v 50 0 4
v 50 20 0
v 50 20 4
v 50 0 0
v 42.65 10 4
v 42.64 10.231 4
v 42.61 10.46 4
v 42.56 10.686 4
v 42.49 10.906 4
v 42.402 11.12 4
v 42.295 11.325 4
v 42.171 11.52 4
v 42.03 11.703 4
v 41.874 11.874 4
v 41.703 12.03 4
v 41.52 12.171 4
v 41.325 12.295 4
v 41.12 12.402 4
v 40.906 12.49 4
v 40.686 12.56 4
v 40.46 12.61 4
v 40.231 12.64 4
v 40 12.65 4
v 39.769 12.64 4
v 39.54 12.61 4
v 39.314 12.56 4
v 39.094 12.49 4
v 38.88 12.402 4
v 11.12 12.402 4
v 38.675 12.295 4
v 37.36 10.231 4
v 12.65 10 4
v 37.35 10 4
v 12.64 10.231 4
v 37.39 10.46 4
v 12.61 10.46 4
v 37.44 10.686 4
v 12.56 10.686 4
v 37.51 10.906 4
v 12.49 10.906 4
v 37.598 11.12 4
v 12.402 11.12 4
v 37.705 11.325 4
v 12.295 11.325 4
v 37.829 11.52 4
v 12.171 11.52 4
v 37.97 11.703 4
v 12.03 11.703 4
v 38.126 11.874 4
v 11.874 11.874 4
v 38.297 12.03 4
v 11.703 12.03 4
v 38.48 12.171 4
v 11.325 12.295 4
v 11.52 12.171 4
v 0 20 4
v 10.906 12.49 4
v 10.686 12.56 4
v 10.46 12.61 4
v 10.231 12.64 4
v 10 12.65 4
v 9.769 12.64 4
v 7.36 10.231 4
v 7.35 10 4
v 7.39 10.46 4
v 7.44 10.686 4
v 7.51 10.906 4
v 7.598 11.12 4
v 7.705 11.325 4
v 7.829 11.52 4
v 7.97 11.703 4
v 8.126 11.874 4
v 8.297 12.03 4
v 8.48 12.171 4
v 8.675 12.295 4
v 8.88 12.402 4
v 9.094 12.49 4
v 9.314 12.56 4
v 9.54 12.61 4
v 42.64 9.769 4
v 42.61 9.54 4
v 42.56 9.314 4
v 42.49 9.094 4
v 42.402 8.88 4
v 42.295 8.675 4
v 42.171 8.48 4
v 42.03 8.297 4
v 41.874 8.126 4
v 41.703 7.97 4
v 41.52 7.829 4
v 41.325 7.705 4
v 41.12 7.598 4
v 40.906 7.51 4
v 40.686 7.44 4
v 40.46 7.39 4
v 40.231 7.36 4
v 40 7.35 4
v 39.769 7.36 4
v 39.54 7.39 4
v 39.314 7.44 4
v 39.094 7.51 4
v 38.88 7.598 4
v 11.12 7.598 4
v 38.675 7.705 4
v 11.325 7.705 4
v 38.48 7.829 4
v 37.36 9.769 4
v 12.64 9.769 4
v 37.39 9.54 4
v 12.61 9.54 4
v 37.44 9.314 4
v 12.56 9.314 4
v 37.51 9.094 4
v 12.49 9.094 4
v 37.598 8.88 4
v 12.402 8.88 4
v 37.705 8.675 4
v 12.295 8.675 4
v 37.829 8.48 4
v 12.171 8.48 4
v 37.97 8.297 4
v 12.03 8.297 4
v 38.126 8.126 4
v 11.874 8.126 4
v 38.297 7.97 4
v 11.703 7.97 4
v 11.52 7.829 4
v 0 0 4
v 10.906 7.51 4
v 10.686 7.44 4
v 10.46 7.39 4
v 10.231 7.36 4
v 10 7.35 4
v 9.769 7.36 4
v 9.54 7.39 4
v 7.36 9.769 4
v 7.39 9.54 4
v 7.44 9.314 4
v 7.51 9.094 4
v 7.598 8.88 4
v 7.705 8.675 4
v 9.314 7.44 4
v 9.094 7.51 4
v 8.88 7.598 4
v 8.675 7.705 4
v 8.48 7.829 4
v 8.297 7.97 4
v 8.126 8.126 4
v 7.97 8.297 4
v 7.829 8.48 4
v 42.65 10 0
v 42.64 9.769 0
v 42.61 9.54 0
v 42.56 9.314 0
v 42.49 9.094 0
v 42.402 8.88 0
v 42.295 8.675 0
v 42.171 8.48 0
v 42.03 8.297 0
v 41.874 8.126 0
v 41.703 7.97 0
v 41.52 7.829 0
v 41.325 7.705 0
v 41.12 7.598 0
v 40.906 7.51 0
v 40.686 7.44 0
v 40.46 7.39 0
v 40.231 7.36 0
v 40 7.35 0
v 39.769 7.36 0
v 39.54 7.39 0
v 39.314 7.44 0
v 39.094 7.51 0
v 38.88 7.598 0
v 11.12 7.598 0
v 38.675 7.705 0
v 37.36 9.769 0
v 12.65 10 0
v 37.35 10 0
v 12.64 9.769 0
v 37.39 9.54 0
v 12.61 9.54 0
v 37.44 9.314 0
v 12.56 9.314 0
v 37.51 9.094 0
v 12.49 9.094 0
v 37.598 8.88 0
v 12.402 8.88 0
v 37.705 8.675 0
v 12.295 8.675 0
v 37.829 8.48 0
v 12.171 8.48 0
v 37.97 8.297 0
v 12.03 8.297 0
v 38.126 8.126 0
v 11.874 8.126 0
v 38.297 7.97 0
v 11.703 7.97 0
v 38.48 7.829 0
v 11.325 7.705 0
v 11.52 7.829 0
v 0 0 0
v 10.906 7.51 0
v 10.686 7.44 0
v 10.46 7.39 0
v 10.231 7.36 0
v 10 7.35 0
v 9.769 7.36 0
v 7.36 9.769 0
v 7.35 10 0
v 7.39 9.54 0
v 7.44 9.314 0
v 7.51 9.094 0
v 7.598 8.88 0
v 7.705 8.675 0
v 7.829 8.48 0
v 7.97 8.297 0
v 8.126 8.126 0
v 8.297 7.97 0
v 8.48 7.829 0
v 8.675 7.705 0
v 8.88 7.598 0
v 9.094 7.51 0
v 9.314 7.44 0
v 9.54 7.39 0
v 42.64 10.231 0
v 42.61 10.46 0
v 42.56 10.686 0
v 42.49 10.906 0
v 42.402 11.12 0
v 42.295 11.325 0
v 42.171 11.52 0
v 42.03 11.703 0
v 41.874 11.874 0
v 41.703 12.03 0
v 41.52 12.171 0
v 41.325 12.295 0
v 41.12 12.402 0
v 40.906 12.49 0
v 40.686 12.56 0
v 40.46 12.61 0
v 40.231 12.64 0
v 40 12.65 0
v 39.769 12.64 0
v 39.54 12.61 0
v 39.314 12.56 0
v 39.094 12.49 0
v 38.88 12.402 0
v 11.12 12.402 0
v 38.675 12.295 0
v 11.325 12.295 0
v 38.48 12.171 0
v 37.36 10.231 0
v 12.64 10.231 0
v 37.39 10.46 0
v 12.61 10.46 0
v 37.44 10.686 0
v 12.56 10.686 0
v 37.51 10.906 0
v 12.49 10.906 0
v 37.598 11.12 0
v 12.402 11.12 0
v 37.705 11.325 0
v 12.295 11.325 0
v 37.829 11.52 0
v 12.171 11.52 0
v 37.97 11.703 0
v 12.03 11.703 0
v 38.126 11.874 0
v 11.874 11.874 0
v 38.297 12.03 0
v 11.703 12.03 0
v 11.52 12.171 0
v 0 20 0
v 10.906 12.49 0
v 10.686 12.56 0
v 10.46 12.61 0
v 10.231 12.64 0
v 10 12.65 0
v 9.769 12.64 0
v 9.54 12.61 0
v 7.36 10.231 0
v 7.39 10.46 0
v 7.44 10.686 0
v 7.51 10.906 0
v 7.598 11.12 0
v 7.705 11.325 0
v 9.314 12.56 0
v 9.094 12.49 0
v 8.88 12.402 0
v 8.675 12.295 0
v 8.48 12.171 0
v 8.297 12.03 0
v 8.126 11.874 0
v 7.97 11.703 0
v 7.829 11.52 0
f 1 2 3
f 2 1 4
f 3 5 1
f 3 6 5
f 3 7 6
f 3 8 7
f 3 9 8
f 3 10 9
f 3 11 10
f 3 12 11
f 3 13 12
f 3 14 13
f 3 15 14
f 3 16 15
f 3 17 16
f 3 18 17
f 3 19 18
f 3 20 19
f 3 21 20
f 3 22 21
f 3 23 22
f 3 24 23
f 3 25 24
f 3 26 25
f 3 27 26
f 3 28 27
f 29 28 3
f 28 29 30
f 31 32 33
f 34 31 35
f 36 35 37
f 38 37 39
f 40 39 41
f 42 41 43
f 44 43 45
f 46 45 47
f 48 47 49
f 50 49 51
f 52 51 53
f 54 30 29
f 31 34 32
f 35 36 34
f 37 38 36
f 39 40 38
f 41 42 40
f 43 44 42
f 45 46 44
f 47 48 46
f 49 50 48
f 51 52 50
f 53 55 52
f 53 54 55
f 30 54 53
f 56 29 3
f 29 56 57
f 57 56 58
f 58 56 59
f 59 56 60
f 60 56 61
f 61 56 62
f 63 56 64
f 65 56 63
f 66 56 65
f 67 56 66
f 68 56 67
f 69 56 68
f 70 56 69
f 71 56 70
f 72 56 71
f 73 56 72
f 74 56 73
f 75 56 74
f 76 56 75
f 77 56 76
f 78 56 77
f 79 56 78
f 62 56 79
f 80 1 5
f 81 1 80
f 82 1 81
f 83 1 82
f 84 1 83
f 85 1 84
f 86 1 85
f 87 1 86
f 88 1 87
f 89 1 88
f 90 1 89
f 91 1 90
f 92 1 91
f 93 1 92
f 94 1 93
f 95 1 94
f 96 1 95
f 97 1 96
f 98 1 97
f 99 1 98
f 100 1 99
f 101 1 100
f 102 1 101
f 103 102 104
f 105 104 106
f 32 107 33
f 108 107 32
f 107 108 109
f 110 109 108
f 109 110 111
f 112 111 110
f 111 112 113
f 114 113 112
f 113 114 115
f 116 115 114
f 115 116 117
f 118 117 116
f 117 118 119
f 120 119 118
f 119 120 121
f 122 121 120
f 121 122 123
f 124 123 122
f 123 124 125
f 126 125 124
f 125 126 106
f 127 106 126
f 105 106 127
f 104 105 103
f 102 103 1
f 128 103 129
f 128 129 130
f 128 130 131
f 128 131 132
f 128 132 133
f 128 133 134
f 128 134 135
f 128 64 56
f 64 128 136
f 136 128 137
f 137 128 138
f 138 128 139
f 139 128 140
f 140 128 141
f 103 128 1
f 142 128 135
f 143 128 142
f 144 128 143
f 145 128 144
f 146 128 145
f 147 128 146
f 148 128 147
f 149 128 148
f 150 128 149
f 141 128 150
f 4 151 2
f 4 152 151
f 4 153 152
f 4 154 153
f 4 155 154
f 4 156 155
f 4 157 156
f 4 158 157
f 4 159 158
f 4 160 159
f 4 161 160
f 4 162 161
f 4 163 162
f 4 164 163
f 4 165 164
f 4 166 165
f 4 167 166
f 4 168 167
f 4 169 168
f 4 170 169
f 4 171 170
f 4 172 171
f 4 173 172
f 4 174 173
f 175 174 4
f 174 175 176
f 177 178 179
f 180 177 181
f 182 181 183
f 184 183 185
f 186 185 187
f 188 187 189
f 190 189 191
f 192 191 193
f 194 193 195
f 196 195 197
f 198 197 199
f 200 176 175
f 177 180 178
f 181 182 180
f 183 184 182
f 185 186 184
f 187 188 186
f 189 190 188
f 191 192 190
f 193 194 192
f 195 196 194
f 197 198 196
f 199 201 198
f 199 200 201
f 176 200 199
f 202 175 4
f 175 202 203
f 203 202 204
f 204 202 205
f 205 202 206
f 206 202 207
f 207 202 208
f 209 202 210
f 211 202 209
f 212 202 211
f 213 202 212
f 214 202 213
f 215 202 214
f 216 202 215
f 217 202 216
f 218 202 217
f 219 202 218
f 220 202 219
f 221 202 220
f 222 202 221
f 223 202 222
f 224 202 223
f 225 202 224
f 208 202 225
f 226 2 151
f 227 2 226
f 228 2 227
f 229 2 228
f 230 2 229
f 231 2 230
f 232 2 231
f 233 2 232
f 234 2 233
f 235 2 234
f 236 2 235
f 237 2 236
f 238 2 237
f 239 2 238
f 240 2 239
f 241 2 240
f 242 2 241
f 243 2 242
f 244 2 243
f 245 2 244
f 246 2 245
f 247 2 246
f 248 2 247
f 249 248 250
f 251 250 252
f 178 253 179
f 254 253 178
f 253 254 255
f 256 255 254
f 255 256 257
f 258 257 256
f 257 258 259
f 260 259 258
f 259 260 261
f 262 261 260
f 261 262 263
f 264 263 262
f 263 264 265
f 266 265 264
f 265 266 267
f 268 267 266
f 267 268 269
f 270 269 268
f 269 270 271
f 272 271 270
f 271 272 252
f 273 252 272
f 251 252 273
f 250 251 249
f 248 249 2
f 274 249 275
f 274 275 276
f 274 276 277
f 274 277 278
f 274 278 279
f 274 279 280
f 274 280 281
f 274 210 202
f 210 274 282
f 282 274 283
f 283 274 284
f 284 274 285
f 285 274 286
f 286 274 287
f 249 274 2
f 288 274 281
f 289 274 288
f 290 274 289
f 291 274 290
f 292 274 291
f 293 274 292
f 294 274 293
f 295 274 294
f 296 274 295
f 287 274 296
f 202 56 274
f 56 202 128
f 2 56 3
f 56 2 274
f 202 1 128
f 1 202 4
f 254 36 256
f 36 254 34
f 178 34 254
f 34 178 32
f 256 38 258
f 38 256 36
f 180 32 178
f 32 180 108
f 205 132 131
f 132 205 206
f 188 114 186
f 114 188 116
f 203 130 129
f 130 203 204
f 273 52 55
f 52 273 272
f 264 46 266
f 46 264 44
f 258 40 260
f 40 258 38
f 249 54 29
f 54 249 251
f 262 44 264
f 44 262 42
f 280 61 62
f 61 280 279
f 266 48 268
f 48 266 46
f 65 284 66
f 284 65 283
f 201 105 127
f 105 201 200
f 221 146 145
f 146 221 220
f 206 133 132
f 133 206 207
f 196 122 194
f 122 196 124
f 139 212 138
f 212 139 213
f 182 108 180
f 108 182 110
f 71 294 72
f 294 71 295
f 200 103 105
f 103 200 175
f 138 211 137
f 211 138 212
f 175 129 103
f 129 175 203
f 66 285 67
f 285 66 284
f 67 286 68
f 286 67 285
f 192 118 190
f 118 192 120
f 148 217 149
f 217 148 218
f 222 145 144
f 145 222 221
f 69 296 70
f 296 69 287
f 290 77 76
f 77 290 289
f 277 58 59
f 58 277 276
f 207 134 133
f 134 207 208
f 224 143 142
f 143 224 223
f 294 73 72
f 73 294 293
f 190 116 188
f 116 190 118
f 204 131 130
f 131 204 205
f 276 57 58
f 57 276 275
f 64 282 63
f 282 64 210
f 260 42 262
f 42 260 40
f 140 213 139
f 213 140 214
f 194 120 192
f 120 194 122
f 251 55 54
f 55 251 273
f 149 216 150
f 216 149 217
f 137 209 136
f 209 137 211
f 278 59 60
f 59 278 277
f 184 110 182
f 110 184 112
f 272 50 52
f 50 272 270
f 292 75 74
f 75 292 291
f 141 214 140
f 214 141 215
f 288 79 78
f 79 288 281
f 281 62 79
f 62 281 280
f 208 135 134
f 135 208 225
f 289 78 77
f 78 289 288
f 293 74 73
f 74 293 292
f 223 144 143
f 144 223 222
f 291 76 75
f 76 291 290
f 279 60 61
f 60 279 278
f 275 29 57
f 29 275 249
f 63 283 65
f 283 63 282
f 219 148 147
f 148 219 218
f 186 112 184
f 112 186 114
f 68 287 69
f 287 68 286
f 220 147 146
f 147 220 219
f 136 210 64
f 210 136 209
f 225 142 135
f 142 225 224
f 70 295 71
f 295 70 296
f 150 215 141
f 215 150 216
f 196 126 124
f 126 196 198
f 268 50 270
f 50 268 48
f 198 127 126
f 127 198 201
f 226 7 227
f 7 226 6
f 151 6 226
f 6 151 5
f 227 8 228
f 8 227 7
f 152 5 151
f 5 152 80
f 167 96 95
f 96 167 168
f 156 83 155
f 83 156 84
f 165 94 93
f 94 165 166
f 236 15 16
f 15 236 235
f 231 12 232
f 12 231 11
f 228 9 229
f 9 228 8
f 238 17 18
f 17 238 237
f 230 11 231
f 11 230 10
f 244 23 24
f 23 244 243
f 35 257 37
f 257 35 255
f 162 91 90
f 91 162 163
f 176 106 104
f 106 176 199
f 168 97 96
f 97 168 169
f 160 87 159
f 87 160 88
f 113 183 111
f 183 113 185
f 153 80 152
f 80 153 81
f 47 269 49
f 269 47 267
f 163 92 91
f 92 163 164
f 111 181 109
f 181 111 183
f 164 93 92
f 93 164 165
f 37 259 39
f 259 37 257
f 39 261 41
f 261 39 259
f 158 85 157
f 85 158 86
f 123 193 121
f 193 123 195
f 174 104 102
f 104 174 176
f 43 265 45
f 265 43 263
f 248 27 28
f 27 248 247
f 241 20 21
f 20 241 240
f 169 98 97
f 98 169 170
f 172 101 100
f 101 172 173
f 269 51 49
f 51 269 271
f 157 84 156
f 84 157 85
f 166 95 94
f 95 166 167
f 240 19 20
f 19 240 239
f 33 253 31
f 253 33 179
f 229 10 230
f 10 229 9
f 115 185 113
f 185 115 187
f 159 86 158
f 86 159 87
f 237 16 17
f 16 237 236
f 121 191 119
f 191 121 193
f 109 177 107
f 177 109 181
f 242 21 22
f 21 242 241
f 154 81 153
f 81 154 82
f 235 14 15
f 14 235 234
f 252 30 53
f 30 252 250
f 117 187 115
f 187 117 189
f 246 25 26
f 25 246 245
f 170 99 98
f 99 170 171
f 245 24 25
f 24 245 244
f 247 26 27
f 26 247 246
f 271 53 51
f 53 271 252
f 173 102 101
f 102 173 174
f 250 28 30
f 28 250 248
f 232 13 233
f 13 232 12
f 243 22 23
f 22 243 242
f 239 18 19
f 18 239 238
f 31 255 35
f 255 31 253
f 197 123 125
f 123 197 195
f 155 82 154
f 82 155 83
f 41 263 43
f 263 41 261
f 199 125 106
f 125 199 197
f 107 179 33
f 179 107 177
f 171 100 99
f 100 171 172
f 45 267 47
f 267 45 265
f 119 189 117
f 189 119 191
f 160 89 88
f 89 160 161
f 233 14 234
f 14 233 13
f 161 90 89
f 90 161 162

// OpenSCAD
$fn=72;

bracket_width=20;   //For 2020 rails
hole_d = 5.3;       //M5 + some margin
bracket_length=50;  //Could be 40 for symmetry, but add some margin
bracket_thickness=4;


difference() {
    cube([bracket_length, bracket_width, bracket_thickness]);

    translate([bracket_width/2, bracket_width/2, -1]) cylinder(d=hole_d, h=bracket_thickness+2);
    translate([bracket_length-bracket_width/2, bracket_width/2, -1]) cylinder(d=hole_d, h=bracket_thickness+2);
}
